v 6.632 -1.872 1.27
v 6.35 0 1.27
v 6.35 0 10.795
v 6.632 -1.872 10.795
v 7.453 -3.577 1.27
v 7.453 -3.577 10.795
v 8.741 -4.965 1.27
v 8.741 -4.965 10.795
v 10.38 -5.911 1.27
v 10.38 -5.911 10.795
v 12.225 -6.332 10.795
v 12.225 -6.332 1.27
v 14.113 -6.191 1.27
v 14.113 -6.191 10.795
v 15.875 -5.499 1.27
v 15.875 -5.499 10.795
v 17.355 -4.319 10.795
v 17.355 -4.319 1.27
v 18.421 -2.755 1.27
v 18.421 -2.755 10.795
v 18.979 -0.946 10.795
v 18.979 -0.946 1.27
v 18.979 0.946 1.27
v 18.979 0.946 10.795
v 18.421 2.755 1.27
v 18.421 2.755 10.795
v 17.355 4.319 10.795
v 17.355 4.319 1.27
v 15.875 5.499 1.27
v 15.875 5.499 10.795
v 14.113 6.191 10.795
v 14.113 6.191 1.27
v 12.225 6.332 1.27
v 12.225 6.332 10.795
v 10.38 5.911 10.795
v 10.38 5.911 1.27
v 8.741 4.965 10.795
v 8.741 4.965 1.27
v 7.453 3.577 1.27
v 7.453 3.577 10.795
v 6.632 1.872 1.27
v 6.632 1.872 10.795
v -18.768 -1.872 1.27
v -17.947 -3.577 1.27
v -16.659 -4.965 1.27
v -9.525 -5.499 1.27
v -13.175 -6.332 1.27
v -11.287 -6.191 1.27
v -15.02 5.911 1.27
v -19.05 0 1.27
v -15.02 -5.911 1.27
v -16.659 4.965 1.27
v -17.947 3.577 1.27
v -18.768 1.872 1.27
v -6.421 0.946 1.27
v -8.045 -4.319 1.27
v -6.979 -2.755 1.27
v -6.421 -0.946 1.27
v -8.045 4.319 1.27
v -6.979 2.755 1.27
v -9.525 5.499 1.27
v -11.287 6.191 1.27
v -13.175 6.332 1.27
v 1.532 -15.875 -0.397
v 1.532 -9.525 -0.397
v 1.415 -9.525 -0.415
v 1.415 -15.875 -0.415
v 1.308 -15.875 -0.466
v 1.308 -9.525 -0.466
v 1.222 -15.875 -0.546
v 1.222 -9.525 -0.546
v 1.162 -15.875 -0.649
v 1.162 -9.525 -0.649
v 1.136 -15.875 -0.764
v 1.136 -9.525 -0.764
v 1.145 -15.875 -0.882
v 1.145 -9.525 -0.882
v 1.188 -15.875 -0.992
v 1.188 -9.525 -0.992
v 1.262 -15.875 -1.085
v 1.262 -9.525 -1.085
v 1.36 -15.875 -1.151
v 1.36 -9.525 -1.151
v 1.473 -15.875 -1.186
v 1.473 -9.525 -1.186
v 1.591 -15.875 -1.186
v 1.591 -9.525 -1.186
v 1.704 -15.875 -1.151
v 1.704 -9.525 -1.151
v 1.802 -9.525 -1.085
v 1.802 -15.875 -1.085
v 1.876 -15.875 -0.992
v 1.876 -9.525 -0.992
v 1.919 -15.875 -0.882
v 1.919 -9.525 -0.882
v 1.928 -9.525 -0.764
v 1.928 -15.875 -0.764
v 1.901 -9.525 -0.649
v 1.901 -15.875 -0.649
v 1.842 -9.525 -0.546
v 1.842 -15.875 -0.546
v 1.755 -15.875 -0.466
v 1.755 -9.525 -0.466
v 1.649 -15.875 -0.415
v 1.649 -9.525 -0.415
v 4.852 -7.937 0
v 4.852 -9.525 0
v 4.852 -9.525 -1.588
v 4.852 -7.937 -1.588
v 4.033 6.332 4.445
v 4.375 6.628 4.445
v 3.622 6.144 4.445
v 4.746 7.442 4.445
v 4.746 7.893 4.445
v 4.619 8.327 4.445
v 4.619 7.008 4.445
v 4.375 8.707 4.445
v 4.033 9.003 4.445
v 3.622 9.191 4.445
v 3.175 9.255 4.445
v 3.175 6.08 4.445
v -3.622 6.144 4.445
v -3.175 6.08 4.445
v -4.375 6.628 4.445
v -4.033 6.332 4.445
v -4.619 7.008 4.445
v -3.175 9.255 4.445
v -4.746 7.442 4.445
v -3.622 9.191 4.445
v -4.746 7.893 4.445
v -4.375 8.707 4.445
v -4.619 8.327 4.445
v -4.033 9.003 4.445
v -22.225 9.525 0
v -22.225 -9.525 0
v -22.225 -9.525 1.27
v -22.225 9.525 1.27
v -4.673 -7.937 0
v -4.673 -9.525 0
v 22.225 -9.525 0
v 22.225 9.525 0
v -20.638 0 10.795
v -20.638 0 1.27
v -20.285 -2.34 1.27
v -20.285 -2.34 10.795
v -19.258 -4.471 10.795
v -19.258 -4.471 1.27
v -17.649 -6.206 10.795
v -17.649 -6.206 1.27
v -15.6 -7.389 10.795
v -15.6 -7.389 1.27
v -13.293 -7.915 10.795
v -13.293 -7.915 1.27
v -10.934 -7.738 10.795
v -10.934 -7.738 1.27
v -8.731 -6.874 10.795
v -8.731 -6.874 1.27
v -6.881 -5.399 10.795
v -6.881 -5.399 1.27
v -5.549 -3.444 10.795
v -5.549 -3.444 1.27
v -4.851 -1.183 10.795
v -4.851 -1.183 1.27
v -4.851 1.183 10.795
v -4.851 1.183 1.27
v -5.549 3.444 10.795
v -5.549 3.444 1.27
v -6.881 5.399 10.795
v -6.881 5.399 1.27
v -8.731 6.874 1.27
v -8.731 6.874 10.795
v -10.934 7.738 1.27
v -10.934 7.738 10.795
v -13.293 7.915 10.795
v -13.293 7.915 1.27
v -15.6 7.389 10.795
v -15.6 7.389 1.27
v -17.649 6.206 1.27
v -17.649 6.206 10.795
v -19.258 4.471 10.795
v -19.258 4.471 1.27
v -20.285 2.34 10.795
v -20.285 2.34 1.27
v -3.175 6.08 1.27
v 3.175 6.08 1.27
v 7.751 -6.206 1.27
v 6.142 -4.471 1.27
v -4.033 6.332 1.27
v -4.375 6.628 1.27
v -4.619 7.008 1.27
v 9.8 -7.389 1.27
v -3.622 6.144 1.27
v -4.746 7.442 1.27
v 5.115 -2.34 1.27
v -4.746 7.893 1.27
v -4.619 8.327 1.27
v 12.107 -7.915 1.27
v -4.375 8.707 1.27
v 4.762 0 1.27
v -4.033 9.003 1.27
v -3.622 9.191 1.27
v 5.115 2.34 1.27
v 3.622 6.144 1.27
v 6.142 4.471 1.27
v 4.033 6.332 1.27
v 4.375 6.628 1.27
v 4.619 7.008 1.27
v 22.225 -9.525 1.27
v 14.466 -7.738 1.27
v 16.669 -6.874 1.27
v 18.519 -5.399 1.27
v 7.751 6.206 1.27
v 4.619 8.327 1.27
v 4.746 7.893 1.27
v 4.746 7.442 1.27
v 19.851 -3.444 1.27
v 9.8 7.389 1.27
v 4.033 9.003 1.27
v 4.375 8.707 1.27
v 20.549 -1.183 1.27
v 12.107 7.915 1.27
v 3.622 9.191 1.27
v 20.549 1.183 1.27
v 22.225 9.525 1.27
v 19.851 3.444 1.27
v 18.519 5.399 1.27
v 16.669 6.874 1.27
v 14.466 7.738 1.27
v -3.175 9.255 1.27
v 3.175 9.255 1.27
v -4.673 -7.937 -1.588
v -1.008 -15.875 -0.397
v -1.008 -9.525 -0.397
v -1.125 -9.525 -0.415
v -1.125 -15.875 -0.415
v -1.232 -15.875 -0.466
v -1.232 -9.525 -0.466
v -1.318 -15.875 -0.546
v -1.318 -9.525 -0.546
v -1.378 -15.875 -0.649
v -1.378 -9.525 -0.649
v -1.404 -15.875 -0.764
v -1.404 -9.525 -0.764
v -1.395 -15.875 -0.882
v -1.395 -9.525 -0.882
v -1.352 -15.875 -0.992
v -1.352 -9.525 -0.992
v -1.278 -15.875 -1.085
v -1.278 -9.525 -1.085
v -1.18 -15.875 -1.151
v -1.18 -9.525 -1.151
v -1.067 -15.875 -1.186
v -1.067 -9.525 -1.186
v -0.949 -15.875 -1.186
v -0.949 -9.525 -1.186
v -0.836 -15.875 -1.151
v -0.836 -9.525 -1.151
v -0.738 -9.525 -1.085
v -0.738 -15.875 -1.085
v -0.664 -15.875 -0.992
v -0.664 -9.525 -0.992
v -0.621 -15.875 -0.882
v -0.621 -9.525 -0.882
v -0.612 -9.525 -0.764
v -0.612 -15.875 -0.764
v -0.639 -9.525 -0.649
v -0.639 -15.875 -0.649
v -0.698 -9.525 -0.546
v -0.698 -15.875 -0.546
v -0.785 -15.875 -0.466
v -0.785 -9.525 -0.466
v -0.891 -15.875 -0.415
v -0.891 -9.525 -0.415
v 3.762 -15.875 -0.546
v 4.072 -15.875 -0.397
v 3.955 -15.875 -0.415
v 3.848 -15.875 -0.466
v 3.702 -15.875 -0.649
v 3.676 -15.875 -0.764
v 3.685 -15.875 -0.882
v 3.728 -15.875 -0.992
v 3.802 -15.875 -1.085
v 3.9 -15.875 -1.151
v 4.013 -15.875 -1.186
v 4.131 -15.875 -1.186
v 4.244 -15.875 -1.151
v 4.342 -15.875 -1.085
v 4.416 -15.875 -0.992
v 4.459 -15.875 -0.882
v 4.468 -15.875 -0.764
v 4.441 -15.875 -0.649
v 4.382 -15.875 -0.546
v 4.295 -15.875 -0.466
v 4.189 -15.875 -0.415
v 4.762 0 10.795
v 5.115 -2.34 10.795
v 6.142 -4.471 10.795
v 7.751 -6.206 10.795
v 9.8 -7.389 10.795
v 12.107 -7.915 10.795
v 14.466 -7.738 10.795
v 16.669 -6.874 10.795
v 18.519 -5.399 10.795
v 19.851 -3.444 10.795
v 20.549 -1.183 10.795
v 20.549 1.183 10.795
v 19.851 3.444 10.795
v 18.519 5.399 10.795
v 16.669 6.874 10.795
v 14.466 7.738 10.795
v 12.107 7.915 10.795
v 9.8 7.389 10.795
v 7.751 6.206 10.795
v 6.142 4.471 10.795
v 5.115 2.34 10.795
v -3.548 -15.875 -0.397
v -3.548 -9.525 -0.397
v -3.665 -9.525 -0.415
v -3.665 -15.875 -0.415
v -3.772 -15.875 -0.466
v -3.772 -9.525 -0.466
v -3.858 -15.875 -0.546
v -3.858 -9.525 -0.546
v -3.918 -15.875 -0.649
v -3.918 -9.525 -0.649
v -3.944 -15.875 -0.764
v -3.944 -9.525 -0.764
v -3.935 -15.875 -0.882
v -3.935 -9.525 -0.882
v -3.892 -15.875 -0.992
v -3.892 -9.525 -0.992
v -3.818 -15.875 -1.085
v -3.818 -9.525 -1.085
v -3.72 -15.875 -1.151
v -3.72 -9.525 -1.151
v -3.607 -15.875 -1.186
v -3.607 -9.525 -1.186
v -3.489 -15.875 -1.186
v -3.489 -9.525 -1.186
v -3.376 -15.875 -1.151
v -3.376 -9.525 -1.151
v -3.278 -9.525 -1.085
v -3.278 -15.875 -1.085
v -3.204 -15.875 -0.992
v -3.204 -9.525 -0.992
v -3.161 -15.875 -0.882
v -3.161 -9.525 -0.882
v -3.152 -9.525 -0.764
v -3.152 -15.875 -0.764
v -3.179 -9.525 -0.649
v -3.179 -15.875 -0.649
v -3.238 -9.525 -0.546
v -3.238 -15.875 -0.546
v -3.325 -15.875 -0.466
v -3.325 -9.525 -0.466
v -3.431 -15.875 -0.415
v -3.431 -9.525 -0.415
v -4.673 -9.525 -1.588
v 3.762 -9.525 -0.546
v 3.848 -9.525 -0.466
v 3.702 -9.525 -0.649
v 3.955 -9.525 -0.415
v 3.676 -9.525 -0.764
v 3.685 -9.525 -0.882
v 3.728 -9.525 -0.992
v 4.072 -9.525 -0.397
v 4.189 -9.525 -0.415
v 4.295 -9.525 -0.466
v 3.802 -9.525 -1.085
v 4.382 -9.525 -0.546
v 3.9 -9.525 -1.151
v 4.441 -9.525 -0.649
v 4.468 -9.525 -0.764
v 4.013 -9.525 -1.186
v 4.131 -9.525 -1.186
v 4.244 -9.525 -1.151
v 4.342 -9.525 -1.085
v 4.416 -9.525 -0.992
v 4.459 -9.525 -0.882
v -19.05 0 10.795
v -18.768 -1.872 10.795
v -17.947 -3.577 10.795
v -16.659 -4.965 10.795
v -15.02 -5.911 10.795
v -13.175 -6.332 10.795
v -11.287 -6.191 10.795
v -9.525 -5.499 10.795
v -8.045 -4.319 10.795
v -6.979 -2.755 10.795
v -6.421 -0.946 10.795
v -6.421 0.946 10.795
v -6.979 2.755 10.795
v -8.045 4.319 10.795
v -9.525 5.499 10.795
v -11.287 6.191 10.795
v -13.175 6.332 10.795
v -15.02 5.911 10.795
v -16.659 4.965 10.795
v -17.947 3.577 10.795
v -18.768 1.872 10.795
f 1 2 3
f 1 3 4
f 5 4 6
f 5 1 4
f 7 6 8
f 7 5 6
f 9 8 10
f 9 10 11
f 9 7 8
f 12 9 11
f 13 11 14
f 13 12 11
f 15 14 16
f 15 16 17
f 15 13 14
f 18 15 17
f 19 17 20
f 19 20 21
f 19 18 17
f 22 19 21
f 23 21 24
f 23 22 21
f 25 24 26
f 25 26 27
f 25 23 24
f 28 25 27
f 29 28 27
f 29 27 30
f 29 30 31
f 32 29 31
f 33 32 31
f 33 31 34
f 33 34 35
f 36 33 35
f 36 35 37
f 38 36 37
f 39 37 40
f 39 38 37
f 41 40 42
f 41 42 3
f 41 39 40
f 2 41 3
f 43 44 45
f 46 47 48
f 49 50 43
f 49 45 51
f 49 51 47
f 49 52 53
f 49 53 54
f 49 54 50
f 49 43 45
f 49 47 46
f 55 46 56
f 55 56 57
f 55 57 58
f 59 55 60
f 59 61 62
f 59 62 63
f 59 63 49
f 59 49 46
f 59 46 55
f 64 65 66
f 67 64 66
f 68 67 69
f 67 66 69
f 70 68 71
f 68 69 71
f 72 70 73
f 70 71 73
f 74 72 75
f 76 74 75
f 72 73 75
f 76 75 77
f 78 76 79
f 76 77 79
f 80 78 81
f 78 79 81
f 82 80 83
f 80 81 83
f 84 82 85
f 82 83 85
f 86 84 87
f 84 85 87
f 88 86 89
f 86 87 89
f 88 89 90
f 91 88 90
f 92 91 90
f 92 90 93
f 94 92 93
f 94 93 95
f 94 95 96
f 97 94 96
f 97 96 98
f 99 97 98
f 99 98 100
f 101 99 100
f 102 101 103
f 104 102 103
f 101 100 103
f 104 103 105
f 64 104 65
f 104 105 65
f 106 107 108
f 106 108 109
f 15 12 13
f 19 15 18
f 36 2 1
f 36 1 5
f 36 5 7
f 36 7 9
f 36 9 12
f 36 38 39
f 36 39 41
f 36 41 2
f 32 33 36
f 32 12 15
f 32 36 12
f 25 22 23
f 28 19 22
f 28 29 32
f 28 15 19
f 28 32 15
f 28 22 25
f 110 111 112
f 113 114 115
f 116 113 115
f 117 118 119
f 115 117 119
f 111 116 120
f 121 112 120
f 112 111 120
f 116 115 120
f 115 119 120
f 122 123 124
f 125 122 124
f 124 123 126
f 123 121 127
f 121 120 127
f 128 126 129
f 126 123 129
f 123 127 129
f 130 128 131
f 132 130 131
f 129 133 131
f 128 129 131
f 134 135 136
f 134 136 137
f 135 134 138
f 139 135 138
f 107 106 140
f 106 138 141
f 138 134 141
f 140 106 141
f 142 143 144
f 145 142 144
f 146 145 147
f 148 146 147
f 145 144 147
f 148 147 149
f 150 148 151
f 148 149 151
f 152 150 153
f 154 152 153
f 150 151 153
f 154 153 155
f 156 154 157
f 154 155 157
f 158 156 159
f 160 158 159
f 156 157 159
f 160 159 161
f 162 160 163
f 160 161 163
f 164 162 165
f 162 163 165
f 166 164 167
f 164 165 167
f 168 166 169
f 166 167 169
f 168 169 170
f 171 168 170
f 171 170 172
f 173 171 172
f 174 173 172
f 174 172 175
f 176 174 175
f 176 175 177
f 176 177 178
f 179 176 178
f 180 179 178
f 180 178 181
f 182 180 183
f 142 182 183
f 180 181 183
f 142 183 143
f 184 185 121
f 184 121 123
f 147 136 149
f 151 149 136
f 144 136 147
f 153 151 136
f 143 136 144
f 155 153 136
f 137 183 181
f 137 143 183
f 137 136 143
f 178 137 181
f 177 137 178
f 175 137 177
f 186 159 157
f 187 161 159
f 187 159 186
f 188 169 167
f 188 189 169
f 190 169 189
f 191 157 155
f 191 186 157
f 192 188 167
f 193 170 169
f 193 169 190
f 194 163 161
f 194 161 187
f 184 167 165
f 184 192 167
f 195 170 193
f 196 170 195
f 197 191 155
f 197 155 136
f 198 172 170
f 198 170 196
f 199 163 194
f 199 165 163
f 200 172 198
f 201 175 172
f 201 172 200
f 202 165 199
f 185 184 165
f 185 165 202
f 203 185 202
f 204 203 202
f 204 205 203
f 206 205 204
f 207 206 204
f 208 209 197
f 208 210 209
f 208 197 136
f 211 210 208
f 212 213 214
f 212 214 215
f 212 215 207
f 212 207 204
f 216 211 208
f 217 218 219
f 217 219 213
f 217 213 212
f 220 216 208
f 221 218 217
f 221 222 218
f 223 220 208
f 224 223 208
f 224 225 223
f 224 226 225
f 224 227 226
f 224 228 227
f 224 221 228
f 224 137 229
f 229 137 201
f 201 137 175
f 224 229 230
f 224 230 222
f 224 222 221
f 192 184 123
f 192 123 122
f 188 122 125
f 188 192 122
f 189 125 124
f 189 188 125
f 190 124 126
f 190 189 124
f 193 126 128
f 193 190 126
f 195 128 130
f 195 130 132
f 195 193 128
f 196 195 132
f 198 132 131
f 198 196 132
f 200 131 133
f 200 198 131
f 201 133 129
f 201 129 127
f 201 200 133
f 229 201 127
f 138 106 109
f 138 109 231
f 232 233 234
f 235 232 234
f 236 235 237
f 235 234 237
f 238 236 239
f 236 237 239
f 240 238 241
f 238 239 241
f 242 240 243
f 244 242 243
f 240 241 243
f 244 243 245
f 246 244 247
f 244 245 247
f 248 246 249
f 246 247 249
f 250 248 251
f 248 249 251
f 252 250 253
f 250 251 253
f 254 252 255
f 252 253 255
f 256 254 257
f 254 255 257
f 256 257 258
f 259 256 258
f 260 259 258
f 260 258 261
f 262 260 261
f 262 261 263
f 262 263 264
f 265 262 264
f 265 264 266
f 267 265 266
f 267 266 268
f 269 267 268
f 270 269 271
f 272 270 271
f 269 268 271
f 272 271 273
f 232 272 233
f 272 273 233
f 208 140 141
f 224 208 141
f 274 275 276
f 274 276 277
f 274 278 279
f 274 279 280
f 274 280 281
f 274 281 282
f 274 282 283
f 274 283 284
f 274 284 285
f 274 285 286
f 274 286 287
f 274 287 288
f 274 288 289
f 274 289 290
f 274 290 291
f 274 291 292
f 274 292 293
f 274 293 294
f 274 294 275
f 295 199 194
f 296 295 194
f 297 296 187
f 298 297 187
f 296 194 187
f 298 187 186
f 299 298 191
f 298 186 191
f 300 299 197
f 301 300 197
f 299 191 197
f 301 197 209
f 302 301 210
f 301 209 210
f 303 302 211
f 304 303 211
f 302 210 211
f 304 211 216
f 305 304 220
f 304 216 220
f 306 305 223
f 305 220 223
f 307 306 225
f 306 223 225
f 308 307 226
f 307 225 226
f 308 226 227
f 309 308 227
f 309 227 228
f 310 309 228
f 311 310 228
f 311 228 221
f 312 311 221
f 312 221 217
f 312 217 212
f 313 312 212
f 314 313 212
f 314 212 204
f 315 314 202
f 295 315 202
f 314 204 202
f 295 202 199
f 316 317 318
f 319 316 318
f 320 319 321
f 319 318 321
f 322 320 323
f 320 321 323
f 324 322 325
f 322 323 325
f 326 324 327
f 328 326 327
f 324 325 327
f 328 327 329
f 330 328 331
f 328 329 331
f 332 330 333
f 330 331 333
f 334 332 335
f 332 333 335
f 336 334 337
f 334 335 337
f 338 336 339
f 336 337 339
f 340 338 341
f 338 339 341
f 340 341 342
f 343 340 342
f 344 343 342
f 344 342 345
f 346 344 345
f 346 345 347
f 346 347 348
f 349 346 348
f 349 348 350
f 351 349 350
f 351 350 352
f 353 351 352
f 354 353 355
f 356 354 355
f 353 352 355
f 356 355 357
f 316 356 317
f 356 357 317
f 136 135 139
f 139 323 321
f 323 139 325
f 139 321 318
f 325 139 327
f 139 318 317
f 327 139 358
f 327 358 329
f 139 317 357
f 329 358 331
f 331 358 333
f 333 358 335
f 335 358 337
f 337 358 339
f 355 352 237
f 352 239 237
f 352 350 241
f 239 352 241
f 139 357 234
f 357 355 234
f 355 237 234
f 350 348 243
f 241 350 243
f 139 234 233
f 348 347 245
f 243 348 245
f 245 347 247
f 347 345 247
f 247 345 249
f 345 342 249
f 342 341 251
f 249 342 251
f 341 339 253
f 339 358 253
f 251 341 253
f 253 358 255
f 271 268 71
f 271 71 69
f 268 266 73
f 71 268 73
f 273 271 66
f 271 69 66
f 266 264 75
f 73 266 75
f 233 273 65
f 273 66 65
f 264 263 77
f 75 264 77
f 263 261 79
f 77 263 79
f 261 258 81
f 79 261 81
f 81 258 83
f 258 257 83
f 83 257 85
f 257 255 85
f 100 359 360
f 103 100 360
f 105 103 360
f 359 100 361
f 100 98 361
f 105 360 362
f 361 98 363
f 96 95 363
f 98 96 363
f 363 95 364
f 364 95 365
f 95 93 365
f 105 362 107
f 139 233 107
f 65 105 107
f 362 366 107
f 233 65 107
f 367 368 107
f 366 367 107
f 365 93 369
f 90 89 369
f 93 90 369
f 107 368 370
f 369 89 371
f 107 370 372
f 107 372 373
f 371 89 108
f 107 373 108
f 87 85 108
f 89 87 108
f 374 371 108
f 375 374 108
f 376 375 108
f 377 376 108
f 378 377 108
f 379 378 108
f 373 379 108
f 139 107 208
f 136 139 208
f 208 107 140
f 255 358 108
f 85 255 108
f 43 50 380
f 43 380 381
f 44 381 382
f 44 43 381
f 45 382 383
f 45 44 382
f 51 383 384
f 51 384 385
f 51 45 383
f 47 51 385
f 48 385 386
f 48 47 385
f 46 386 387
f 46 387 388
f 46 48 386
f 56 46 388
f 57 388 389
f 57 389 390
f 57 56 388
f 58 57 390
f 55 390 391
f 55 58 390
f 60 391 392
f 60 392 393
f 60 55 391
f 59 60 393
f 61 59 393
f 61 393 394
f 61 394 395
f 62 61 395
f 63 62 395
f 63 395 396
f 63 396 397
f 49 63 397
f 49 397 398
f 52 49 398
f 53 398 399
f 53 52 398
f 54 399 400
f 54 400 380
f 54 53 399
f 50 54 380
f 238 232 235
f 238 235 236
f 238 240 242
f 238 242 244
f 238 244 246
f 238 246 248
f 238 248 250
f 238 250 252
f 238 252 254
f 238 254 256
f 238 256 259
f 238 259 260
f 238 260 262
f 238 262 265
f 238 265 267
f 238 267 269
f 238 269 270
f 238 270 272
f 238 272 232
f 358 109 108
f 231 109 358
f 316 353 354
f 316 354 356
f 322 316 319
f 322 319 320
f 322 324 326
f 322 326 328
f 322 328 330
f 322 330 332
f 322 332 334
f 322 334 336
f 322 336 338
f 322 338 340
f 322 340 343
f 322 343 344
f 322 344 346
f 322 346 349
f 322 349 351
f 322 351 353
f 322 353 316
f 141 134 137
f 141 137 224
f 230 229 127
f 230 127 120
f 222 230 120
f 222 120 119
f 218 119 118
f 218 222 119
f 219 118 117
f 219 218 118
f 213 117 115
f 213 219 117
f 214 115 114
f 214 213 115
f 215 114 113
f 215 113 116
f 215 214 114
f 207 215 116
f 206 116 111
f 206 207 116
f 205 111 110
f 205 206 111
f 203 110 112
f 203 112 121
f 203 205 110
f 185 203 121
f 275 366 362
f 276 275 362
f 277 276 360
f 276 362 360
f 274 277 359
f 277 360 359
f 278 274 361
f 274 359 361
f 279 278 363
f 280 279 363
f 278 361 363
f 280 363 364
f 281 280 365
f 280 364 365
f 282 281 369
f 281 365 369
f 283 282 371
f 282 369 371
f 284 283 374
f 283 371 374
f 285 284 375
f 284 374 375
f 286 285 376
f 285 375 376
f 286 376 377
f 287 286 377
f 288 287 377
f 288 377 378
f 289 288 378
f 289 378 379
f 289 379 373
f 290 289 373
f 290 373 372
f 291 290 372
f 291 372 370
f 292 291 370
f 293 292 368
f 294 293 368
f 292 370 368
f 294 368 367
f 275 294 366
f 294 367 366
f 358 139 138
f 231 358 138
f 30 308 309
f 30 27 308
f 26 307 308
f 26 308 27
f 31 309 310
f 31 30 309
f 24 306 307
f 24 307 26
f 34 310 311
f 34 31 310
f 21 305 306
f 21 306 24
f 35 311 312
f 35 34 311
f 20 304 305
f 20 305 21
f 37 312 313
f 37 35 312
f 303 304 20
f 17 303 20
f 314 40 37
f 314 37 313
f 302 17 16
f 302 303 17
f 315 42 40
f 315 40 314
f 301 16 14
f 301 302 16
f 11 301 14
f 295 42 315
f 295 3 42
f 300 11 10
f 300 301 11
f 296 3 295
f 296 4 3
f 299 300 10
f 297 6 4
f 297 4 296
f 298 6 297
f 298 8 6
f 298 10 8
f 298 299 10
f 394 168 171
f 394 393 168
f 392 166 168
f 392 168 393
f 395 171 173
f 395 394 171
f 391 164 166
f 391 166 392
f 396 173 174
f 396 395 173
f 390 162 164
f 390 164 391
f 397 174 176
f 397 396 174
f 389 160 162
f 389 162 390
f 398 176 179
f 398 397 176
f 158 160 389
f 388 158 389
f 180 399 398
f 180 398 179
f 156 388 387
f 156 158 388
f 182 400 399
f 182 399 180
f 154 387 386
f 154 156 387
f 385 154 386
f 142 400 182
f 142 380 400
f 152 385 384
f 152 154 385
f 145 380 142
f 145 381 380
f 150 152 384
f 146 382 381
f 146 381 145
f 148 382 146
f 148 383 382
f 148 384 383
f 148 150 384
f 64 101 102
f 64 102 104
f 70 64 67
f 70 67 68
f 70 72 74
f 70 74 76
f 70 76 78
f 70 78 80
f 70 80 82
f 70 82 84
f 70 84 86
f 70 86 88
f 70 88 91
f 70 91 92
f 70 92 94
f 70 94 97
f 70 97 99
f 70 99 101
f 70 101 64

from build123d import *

# Parameters (mm, degrees)
SKETCH1_W           = 44.45
SKETCH1_H           = 19.05
BOSS_EXTRUDE1_DEPTH = 1.27
SKETCH2_R           = 7.9375
SKETCH2_R_2         = 6.35
BOSS_EXTRUDE2_DEPTH = 9.525
SKETCH4_W           = 9.525
SKETCH4_H           = 1.5875
BOSS_EXTRUDE3_DEPTH = 1.5875
SKETCH5_R           = 0.396875
BOSS_EXTRUDE4_DEPTH = 6.35
BOSS_EXTRUDE5_DEPTH = 3.175


with BuildPart() as part:
    # Sketch1 → Boss-Extrude1 (new body)
    with BuildSketch(Plane.XY):
        Rectangle(SKETCH1_W, SKETCH1_H)
    extrude(amount=BOSS_EXTRUDE1_DEPTH)

    # Sketch2 → Boss-Extrude2 (add)
    # profile 1 of 2: a face of its own
    with BuildSketch(Plane.XY.offset(1.27)):
        with Locations((12.7, 0)):
            Circle(SKETCH2_R)
        with Locations((12.7, 0)):
            Circle(SKETCH2_R_2, mode=Mode.SUBTRACT)
    # profile 2 of 2: a face of its own
    with BuildSketch(Plane.XY.offset(1.27)):
        with Locations((-12.7, 0)):
            Circle(SKETCH2_R)
        with Locations((-12.7, 0)):
            Circle(SKETCH2_R_2, mode=Mode.SUBTRACT)
    extrude(amount=BOSS_EXTRUDE2_DEPTH)

    # Sketch4 → Boss-Extrude3 (add)
    with BuildSketch(Plane(origin=(0, 0, 0), x_dir=(-1, 0, 0), z_dir=(0, 0, -1))):
        with Locations((-0.089489862, -8.73125)):
            Rectangle(SKETCH4_W, SKETCH4_H)
    extrude(amount=BOSS_EXTRUDE3_DEPTH)

    # Sketch5 → Boss-Extrude4 (add)
    with BuildSketch(Plane.XZ.offset(9.525)):
        with Locations((-3.548073308, -0.79375)):
            Circle(SKETCH5_R)
        with Locations((-1.008073308, -0.79375)):
            Circle(SKETCH5_R)
        with Locations((1.531926692, -0.79375)):
            Circle(SKETCH5_R)
        with Locations((4.071926692, -0.79375)):
            Circle(SKETCH5_R)
    extrude(amount=BOSS_EXTRUDE4_DEPTH)

    # Sketch6 → Boss-Extrude5 (add)
    with BuildSketch(Plane.XY.offset(1.27)):
        with BuildLine():
            ThreePointArc((-3.175, 9.254970204), (-4.7625, 7.667470204), (-3.175, 6.079970204))
            Line((-3.175, 6.079970204), (3.175, 6.079970204))
            ThreePointArc((3.175, 6.079970204), (4.7625, 7.667470204), (3.175, 9.254970204))
            Line((3.175, 9.254970204), (-3.175, 9.254970204))
        make_face()
    extrude(amount=BOSS_EXTRUDE5_DEPTH)


solid = part.part
